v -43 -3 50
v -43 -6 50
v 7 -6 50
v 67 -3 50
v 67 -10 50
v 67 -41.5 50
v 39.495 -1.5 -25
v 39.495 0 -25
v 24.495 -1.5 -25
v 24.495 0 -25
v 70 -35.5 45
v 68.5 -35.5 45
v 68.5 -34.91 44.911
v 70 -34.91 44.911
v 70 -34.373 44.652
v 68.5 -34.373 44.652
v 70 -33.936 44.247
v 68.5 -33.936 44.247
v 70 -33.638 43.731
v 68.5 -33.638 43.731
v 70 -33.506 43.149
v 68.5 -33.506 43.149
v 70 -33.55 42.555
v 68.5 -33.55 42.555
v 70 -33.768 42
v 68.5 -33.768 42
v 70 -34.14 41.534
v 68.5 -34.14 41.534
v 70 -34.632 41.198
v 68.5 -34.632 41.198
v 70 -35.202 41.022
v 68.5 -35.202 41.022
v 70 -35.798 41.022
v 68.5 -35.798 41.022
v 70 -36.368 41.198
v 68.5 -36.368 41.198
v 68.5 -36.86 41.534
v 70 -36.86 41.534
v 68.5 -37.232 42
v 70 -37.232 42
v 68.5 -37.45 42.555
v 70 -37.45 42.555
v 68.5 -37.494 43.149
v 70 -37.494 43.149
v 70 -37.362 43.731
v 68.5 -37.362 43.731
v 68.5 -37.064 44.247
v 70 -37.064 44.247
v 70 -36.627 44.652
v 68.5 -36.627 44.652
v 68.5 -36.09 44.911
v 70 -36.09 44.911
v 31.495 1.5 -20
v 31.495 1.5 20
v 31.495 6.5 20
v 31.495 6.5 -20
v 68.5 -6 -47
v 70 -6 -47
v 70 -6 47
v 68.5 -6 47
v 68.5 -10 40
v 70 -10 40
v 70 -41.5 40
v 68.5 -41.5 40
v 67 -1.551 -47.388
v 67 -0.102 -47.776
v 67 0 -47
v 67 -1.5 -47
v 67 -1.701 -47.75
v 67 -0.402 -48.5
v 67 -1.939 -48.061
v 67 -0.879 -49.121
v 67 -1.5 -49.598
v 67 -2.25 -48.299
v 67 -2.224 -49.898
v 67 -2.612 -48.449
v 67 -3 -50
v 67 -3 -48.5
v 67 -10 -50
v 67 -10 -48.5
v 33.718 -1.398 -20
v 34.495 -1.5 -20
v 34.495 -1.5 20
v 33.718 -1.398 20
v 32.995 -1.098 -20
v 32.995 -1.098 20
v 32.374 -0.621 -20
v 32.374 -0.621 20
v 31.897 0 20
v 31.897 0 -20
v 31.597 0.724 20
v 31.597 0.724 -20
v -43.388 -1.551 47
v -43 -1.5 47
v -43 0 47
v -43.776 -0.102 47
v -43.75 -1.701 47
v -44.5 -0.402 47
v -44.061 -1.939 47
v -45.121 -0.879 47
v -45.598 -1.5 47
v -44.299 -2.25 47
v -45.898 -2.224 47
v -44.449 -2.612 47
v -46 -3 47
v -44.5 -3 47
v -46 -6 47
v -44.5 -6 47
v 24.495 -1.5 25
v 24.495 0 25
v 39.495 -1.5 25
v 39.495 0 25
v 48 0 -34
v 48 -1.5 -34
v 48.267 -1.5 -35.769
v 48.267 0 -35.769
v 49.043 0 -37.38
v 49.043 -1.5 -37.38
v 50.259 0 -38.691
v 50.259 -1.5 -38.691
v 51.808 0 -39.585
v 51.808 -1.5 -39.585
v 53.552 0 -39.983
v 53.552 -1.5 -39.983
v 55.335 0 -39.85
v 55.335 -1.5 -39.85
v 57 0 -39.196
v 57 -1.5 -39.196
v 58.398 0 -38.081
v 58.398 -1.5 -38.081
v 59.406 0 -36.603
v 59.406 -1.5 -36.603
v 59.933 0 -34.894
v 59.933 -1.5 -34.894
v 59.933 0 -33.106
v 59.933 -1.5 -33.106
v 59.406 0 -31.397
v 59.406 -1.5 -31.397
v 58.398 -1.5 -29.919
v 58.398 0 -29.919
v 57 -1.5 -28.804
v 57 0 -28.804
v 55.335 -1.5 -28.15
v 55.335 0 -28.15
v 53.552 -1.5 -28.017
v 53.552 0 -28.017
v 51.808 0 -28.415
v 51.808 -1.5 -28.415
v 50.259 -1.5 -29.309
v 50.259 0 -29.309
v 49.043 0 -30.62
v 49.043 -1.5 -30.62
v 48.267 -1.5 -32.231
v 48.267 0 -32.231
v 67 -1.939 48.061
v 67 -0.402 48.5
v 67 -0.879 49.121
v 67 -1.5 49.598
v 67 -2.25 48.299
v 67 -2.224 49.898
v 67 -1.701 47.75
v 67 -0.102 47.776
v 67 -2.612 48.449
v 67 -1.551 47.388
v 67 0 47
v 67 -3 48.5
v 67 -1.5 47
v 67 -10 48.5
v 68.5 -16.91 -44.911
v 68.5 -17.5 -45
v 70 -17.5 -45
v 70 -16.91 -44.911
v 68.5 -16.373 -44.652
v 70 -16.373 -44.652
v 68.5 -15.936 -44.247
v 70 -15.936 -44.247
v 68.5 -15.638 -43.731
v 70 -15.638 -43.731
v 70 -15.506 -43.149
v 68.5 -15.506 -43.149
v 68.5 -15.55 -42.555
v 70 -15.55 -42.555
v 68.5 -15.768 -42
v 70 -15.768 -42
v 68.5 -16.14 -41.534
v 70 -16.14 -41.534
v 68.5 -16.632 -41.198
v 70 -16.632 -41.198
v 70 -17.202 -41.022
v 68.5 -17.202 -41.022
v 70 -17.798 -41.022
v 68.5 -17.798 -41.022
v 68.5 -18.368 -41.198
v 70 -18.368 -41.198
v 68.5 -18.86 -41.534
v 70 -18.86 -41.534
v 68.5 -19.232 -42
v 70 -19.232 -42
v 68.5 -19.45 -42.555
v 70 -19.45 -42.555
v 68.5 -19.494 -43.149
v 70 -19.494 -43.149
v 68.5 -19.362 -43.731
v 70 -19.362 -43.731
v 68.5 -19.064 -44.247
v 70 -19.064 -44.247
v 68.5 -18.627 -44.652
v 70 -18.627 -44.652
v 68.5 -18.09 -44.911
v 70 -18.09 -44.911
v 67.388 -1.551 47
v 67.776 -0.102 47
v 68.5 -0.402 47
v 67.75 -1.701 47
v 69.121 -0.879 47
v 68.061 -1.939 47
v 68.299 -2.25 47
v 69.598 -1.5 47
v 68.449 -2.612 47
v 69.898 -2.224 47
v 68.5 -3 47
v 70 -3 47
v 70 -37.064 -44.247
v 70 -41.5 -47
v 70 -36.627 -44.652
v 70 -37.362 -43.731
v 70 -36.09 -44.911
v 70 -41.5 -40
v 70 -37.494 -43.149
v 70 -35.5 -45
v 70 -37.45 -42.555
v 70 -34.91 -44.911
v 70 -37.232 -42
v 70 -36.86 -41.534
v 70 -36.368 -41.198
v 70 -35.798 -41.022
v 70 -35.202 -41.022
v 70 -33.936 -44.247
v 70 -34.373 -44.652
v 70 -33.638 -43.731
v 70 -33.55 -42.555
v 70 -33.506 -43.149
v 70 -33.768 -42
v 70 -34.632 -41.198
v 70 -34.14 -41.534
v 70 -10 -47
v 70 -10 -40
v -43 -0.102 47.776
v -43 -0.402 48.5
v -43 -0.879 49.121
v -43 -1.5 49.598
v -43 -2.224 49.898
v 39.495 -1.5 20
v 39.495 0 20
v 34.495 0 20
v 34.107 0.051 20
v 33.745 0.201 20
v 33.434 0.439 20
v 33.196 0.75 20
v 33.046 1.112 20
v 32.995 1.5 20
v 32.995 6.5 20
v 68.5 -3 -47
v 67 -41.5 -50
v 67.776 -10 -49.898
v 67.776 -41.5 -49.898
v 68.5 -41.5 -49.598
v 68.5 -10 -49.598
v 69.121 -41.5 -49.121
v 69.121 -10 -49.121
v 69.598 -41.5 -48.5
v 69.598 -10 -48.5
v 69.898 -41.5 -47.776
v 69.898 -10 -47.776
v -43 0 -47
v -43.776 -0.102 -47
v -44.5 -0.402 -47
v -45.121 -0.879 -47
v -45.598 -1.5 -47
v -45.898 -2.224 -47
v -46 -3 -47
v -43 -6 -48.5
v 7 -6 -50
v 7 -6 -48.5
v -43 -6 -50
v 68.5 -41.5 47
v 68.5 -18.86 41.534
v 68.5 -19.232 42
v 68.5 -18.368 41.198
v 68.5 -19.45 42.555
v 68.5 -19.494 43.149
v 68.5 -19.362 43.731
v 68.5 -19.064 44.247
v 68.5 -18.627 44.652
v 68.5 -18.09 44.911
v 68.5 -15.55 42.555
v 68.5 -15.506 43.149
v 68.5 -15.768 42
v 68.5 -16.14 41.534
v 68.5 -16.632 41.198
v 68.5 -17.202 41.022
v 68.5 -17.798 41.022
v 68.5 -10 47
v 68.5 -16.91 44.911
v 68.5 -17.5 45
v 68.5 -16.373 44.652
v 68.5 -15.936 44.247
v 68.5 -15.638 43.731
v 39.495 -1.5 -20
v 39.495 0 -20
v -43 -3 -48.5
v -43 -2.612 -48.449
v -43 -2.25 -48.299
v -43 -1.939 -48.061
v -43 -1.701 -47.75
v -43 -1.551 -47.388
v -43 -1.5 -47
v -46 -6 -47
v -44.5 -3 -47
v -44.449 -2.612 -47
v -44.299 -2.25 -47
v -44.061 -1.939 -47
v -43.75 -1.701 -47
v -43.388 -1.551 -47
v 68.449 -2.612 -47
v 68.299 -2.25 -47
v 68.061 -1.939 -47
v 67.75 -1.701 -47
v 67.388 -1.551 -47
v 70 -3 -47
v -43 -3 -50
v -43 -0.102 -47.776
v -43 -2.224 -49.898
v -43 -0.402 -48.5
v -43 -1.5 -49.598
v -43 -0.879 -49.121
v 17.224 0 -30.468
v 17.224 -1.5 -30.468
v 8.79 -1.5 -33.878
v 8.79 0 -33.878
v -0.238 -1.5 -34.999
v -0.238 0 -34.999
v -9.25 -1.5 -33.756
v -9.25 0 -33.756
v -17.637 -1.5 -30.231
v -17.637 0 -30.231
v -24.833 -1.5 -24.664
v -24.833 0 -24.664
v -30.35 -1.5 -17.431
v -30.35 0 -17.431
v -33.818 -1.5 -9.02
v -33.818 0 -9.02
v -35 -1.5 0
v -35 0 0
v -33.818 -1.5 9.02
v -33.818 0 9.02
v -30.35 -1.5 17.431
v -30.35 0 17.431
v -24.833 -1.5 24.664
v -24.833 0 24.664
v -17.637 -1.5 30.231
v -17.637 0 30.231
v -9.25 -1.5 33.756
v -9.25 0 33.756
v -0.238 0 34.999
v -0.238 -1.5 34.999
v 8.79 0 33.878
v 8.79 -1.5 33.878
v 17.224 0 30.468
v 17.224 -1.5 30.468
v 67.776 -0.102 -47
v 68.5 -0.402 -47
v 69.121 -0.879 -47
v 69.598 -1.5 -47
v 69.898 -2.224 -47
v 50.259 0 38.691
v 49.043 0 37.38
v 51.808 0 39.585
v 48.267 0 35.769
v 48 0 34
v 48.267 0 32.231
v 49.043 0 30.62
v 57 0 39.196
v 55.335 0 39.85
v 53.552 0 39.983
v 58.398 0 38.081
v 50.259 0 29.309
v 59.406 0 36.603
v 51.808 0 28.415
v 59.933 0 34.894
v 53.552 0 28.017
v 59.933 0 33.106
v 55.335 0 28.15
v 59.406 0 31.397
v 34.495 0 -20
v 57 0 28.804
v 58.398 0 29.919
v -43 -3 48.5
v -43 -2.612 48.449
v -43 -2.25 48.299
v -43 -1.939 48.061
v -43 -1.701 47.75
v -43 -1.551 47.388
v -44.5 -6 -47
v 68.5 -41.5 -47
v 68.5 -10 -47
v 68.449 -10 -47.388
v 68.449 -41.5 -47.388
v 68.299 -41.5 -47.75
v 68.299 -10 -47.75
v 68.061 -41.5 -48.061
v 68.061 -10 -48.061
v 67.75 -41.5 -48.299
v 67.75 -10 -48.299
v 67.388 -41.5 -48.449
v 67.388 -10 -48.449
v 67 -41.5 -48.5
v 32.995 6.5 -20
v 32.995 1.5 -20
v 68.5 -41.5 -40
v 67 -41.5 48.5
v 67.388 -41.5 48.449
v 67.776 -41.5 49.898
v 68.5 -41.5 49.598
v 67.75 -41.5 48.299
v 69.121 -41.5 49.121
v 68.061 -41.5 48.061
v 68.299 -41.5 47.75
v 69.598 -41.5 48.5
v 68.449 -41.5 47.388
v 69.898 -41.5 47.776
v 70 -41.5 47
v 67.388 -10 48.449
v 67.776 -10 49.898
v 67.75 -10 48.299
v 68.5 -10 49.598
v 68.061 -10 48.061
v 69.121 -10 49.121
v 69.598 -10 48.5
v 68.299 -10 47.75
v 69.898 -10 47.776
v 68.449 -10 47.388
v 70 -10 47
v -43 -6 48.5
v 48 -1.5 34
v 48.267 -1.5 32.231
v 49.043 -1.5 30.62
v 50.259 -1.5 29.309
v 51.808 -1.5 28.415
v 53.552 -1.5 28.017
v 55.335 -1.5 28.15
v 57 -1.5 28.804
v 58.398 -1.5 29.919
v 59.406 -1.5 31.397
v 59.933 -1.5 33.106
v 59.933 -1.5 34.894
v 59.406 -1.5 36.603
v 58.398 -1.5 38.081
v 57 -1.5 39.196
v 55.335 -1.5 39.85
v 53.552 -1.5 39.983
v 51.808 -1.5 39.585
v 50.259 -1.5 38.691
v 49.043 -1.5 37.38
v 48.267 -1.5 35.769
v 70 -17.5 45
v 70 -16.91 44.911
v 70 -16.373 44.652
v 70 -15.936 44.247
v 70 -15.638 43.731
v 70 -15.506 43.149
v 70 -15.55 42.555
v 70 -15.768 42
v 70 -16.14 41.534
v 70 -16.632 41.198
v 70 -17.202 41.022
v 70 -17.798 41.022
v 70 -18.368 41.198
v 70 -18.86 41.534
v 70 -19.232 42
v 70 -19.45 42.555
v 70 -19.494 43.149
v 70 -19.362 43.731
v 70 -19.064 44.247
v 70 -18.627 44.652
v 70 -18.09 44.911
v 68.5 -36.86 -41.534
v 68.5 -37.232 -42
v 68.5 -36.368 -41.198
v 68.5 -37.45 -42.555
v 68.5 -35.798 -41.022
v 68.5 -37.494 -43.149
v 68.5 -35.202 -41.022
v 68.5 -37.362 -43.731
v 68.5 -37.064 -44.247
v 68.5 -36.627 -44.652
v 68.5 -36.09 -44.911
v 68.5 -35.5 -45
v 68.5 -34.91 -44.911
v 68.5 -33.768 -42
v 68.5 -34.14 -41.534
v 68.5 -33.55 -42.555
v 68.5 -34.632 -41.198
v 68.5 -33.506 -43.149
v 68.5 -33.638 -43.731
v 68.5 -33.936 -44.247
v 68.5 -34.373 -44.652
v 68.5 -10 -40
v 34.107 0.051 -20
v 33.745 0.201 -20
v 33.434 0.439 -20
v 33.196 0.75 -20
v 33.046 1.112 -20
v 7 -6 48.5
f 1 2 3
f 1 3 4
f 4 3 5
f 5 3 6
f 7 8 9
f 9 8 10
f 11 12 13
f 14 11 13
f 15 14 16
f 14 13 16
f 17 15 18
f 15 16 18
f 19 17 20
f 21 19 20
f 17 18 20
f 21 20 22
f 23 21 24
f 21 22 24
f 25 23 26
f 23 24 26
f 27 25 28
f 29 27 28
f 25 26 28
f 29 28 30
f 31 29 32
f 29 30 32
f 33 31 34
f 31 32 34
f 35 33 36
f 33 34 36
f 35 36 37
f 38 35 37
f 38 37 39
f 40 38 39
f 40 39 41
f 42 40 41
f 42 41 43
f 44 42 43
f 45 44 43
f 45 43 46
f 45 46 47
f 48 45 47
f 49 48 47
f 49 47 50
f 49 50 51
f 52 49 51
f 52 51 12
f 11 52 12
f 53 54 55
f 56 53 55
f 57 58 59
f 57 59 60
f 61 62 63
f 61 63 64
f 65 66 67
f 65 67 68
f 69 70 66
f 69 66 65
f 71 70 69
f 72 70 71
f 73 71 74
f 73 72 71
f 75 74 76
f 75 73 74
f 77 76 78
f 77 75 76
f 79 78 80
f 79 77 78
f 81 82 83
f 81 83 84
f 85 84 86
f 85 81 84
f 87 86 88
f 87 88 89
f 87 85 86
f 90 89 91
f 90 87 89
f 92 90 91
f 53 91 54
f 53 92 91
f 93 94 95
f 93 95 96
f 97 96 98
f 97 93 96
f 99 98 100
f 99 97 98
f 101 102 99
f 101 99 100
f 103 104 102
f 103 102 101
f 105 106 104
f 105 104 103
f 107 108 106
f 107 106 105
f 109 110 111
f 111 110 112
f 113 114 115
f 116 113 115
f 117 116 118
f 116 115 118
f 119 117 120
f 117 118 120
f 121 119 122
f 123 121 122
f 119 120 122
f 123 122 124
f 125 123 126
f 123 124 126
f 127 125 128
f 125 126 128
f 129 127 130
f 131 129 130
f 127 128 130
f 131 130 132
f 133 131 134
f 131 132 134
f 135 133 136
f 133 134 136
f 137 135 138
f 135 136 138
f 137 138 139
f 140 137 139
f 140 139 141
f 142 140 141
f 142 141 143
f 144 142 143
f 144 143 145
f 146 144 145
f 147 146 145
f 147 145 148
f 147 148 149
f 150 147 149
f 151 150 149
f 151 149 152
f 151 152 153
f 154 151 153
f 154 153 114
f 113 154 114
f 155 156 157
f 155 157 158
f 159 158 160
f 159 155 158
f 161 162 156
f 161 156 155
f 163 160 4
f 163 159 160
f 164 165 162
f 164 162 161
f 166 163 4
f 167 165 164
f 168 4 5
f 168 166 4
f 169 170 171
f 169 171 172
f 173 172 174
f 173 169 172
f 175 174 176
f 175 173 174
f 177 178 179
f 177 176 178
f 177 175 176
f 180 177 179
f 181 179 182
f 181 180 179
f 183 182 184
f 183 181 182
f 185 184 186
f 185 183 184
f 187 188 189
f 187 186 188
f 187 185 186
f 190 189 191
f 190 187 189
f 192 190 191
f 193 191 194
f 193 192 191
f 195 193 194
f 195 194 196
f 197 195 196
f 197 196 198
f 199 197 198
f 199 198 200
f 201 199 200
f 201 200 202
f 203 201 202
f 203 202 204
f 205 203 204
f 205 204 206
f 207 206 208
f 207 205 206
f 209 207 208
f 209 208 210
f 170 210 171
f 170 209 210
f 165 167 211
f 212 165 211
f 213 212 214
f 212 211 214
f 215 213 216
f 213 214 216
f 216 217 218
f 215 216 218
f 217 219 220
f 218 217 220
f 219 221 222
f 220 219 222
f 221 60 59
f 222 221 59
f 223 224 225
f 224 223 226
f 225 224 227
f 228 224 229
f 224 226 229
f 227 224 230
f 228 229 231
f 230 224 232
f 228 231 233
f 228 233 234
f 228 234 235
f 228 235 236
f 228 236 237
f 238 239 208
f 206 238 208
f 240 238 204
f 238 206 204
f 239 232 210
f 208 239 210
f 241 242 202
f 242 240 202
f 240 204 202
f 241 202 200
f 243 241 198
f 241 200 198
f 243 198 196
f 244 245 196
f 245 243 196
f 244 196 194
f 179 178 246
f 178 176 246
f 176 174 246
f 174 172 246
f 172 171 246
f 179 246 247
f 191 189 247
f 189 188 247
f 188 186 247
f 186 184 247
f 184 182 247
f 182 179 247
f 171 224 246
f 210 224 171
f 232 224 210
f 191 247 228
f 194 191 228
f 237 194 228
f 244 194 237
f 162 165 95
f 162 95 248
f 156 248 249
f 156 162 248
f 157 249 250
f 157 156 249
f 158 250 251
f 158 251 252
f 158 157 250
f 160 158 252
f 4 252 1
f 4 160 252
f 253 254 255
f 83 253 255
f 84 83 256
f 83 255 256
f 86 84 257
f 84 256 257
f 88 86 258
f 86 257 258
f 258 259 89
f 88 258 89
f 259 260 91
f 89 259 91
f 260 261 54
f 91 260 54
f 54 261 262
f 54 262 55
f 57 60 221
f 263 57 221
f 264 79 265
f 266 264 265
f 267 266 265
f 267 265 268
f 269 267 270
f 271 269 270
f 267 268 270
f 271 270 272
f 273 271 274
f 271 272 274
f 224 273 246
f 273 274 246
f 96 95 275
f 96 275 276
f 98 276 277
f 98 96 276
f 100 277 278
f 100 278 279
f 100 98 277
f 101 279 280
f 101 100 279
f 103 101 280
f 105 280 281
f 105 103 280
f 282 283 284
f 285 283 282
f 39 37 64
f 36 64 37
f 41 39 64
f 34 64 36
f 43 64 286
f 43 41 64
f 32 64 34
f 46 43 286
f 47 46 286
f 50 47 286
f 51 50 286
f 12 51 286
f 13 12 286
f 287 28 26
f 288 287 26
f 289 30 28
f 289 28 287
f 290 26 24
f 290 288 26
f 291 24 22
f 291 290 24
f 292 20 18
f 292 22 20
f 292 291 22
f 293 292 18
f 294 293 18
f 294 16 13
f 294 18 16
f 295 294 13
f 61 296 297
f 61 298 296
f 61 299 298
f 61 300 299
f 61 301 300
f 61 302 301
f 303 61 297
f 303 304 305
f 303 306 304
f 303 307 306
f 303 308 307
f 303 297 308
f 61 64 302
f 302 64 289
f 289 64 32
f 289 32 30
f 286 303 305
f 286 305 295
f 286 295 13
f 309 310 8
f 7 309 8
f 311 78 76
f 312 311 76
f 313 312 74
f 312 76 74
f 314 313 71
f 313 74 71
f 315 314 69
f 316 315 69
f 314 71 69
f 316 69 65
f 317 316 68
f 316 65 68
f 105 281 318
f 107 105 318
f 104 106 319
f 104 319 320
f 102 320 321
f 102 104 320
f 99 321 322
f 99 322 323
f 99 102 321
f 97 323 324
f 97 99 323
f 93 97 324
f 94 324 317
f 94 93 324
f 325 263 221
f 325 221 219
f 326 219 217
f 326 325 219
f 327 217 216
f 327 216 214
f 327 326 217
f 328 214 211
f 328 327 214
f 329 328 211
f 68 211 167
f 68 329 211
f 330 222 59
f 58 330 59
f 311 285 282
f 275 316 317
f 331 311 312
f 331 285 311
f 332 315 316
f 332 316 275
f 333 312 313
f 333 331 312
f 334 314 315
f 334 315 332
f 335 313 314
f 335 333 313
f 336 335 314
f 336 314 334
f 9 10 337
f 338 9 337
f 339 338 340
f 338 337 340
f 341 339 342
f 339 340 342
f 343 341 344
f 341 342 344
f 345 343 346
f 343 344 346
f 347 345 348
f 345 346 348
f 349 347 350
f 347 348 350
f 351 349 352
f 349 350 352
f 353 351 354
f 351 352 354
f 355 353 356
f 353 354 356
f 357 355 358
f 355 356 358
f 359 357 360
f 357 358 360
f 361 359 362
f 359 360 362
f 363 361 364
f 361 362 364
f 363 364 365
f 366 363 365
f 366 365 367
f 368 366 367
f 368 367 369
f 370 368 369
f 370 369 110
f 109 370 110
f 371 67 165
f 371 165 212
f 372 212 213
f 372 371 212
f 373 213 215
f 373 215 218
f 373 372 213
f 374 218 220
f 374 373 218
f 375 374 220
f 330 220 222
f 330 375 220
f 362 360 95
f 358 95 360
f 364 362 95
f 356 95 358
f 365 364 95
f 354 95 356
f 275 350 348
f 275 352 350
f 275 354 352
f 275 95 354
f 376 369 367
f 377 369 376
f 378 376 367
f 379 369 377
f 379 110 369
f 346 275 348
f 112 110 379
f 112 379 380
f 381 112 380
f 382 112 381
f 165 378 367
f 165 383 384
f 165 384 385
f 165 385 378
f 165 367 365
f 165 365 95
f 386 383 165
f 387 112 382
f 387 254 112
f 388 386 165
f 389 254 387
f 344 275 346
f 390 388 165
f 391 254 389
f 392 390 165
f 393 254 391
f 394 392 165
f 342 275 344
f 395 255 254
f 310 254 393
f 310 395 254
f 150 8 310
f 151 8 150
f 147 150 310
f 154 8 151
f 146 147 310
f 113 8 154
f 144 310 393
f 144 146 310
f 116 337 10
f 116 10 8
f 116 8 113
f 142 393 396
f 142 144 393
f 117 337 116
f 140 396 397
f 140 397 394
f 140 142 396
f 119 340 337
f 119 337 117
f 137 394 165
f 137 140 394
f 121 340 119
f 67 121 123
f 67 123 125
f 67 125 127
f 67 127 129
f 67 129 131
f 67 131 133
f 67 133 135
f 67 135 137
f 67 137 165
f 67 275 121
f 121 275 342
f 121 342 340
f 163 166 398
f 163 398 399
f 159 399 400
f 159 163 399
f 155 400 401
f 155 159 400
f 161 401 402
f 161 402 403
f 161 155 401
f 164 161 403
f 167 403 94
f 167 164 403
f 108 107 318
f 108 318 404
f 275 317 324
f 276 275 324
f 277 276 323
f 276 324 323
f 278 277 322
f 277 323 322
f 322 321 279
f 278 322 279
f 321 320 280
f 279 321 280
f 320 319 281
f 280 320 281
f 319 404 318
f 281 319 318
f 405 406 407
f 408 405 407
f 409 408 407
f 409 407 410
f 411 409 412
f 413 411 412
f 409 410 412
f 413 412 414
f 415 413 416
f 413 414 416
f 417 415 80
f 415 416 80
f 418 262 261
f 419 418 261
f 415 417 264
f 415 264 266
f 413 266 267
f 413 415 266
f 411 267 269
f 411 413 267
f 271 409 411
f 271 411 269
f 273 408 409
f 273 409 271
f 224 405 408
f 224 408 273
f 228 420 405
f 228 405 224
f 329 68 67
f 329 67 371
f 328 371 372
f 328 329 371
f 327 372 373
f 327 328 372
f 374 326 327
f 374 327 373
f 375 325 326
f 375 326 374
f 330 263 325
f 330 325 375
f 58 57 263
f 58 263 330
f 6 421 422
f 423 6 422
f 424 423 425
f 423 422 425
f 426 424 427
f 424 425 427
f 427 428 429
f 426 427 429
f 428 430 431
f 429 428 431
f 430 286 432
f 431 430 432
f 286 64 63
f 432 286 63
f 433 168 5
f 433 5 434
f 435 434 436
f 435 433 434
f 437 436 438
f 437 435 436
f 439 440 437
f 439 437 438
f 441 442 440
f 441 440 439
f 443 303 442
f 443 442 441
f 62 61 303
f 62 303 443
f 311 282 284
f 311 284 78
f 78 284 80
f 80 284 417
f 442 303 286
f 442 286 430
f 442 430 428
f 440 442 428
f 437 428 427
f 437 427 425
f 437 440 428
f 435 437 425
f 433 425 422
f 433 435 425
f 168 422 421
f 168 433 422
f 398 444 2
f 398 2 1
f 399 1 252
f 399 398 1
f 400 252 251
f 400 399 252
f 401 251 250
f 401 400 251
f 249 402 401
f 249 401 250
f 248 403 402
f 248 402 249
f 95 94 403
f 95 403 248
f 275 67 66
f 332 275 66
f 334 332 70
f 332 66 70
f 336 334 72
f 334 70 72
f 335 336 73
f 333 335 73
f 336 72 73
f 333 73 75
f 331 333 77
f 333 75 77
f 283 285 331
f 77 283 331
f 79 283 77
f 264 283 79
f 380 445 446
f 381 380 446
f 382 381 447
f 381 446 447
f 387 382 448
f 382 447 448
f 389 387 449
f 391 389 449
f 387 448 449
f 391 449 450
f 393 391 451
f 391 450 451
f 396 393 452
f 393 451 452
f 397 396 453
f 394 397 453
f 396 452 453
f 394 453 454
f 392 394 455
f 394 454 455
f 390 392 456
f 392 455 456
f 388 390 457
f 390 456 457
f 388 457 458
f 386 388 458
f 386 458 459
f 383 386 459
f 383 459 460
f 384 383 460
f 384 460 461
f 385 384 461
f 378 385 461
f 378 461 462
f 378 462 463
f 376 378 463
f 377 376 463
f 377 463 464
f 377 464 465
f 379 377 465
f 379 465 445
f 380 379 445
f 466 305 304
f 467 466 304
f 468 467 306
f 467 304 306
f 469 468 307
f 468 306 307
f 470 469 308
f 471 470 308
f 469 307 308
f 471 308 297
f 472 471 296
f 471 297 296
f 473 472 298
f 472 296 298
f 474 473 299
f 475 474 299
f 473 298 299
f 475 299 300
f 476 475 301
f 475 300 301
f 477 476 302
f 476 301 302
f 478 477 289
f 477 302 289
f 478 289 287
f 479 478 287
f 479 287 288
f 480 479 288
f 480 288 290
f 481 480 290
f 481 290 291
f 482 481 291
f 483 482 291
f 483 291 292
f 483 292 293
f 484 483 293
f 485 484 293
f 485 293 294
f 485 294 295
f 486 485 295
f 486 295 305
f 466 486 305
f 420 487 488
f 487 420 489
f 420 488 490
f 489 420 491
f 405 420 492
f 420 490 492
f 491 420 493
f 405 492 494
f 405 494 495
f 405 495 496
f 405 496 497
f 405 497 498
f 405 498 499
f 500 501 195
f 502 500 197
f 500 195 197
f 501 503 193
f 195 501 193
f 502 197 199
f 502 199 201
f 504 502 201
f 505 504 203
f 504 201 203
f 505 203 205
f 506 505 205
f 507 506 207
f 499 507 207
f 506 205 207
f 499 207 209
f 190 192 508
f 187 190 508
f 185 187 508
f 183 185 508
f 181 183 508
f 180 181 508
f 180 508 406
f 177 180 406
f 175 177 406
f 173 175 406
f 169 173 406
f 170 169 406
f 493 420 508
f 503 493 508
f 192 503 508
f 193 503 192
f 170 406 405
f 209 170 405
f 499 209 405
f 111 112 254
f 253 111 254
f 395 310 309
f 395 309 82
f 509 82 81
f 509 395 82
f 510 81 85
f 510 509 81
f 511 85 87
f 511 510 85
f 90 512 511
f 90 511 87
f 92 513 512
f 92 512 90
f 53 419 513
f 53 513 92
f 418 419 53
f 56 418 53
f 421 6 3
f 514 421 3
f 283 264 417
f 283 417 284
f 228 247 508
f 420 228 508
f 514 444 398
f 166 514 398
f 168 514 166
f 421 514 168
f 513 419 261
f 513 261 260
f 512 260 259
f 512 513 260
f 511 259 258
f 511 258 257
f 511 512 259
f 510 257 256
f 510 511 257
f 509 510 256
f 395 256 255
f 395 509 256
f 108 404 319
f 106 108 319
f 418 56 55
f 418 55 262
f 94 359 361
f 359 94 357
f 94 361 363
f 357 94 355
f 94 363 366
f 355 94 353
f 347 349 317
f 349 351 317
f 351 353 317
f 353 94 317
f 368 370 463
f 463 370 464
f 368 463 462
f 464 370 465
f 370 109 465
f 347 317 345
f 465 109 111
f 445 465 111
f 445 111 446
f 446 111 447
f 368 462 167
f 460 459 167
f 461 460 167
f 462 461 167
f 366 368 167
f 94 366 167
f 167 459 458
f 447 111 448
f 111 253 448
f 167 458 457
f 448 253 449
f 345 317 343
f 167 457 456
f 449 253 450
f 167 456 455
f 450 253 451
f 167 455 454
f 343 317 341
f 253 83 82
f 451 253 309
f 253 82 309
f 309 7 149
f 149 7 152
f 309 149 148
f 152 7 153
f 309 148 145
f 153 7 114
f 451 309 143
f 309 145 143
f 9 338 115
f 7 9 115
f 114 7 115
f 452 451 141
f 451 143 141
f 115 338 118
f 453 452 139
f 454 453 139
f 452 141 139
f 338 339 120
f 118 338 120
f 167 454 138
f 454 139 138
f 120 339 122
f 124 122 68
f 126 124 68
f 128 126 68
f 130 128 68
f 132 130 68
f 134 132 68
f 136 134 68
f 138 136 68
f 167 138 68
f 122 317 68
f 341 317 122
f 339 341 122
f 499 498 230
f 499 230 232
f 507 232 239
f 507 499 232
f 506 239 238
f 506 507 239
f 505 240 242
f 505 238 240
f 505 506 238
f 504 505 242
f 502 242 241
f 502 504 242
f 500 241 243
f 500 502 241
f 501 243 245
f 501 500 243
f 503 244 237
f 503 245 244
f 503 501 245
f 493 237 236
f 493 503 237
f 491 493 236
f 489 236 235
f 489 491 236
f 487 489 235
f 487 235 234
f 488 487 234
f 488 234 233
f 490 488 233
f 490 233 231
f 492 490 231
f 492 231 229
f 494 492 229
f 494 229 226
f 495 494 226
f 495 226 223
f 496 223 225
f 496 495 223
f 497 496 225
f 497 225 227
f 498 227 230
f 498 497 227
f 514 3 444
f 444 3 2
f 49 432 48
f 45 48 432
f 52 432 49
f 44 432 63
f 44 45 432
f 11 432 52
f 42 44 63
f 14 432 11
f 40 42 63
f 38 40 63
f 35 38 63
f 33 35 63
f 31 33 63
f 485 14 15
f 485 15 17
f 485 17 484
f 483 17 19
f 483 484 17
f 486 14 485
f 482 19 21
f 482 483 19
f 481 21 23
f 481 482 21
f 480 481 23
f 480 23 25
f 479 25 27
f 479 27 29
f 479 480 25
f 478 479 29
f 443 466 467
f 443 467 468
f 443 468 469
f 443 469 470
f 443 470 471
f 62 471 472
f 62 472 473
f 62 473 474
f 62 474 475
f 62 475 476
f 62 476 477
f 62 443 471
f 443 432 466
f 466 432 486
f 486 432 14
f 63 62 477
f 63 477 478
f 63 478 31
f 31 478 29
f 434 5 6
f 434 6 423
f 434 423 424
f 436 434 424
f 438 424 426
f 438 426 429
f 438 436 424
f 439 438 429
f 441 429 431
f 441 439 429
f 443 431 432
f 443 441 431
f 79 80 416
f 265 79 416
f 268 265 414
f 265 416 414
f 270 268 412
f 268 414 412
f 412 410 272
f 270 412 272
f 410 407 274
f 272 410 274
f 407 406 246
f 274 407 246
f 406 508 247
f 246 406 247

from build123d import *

# Parameters (mm, degrees)
SKETCH1_W                    = 110
SKETCH1_H                    = 100
BASE_FLANGE1_DEPTH           = 1.5
EDGE_FLANGE1_STRIP_W         = 9
EDGE_FLANGE1_STRIP_H         = 1.5
EDGE_FLANGE1_STRIP_CUT_DEPTH = 110
EDGE_FLANGE1_DEPTH           = 110
EDGE_FLANGE1_FLAT_DEPTH      = 1.5
EDGE_FLANGE2_DEPTH           = 31.5
F_4_0_4_DIAMETER_HOLE1_D     = 4
EDGE_FLANGE3_DEPTH           = 94
EDGE_FLANGE3_BEND_DEPTH      = 94
F_12_0_12_DIAMETER_HOLE1_D   = 12
EDGE_FLANGE4_STRIP_W         = 9
EDGE_FLANGE4_STRIP_H         = 1.5
EDGE_FLANGE4_STRIP_CUT_DEPTH = 40
EDGE_FLANGE4_DEPTH           = 40


# Sheet-metal steps are written as plain solids
with BuildPart() as part:
    # Sketch1 → Base-Flange1 (new body)
    with BuildSketch(Plane(origin=(0, 0, 0), x_dir=(1, 0, 0), z_dir=(0, 1, 0))):
        with Locations((12, 0)):
            Rectangle(SKETCH1_W, SKETCH1_H)
        with BuildLine():
            Line((24.494897428, -25), (39.494897428, -25))
            Line((39.494897428, -25), (39.494897428, -20))
            Line((39.494897428, -20), (31.494897428, -20))
            Line((31.494897428, -20), (31.494897428, 20))
            Line((31.494897428, 20), (39.494897428, 20))
            Line((39.494897428, 20), (39.494897428, 25))
            Line((39.494897428, 25), (24.494897428, 25))
            ThreePointArc((24.494897428, 25), (-35, 0), (24.494897428, -25))
        make_face(mode=Mode.SUBTRACT)
    extrude(amount=-BASE_FLANGE1_DEPTH)

    # Edge-Flange1 strip (across the edge) → Edge-Flange1 strip cut (cut)
    with BuildSketch(Plane(origin=(67, -1.5, 50), x_dir=(0, 0, -1), z_dir=(-1, 0, 0))):
        with Locations((-1.5, -0.75)):
            Rectangle(EDGE_FLANGE1_STRIP_W, EDGE_FLANGE1_STRIP_H)
    edge_flange1_strip_cut = extrude(amount=EDGE_FLANGE1_STRIP_CUT_DEPTH, mode=Mode.SUBTRACT)

    # Edge-Flange1 bend section (across the edge) → Edge-Flange1 (add)
    with BuildSketch(Plane(origin=(67, -1.5, 50), x_dir=(0, 0, -1), z_dir=(-1, 0, 0))):
        with BuildLine():
            Line((0, 1.5), (1.5, 1.5))
            ThreePointArc((1.5, 1.5), (1.939339828, 0.439339828), (3, 0))
            Line((3, 0), (3, -1.5))
            ThreePointArc((3, -1.5), (0.878679656, -0.621320344), (0, 1.5))
        make_face()
    edge_flange1 = extrude(amount=EDGE_FLANGE1_DEPTH)

    # Edge-Flange1 profile (on flange) → Edge-Flange1 flat (add)
    with BuildSketch(Plane(origin=(0, -1.5, 50), x_dir=(1, 0, 0), z_dir=(0, 0, -1))):
        Polygon((-43, 1.5), (67, 1.5), (67, 40), (7, 4.5), (-43, 4.5), align=None)
    edge_flange1_flat = extrude(amount=EDGE_FLANGE1_FLAT_DEPTH)

    # Edge-Flange2 section (across the edge) → Edge-Flange2 (add)
    with BuildSketch(Plane(origin=(68.5, -10, 48.5), x_dir=(-1, 0, 0), z_dir=(0, -1, 0))):
        with BuildLine():
            Line((-1.5, 1.5), (-1.5, 8.5))
            Line((-1.5, 8.5), (0, 8.5))
            Line((0, 8.5), (0, 1.5))
            ThreePointArc((0, 1.5), (0.439339828, 0.439339828), (1.5, 0))
            Line((1.5, 0), (1.5, -1.5))
            ThreePointArc((1.5, -1.5), (-0.621320344, -0.621320344), (-1.5, 1.5))
        make_face()
    edge_flange2 = extrude(amount=EDGE_FLANGE2_DEPTH)

    # Ø4.0 (4) Diameter Hole1 (through all)
    with Locations(Plane(origin=(70, 0, 0), x_dir=(0, 0, -1), z_dir=(1, 0, 0))):
        with Locations((-43, -17.5), (-43, -35.5)):
            f_4_0_4_diameter_hole1 = Hole(F_4_0_4_DIAMETER_HOLE1_D / 2)

    # Mirror1: Edge-Flange1 strip cut, Edge-Flange1, Edge-Flange1 flat, Edge-Flange2, Ø4.0 (4) Diameter Hole1 across plane
    add(edge_flange1_strip_cut.mirror(Plane.XY), mode=Mode.SUBTRACT)
    add(edge_flange1.mirror(Plane.XY))
    add(edge_flange1_flat.mirror(Plane.XY))
    add(edge_flange2.mirror(Plane.XY))
    add(f_4_0_4_diameter_hole1.mirror(Plane.XY), mode=Mode.SUBTRACT)

    # Edge-Flange3 section (across the edge) → Edge-Flange3 (add)
    with BuildSketch(Plane(origin=(68.5, -1.5, -47), x_dir=(-1, 0, 0), z_dir=(0, 0, 1))):
        with BuildLine():
            Line((-1.5, 1.5), (-1.5, 4.5))
            Line((-1.5, 4.5), (0, 4.5))
            Line((0, 4.5), (0, 1.5))
            ThreePointArc((0, 1.5), (0.439339828, 0.439339828), (1.5, 0))
            Line((1.5, 0), (1.5, -1.5))
            ThreePointArc((1.5, -1.5), (-0.621320344, -0.621320344), (-1.5, 1.5))
        make_face()
    extrude(amount=EDGE_FLANGE3_DEPTH)

    # Edge-Flange3 section 2 (across the edge) → Edge-Flange3 bend (add)
    with BuildSketch(Plane(origin=(-44.5, -1.5, 47), x_dir=(1, 0, 0), z_dir=(0, 0, -1))):
        with BuildLine():
            Line((-1.5, 1.5), (-1.5, 4.5))
            Line((-1.5, 4.5), (0, 4.5))
            Line((0, 4.5), (0, 1.5))
            ThreePointArc((0, 1.5), (0.439339828, 0.439339828), (1.5, 0))
            Line((1.5, 0), (1.5, -1.5))
            ThreePointArc((1.5, -1.5), (-0.621320344, -0.621320344), (-1.5, 1.5))
        make_face()
    extrude(amount=EDGE_FLANGE3_BEND_DEPTH)

    # Ø12.0 (12) Diameter Hole1 (through all)
    with Locations(Plane(origin=(0, 0, 0), x_dir=(1, 0, 0), z_dir=(0, 1, 0))):
        with Locations((54, 34), (54, -34)):
            Hole(F_12_0_12_DIAMETER_HOLE1_D / 2)

    # Edge-Flange4 strip (across the edge) → Edge-Flange4 strip cut (cut)
    with BuildSketch(Plane(origin=(31.494897428, 0, -20), x_dir=(1, 0, 0), z_dir=(0, 0, 1))):
        with Locations((-1.5, -0.75)):
            Rectangle(EDGE_FLANGE4_STRIP_W, EDGE_FLANGE4_STRIP_H)
    extrude(amount=EDGE_FLANGE4_STRIP_CUT_DEPTH, mode=Mode.SUBTRACT)

    # Edge-Flange4 section (across the edge) → Edge-Flange4 (add)
    with BuildSketch(Plane(origin=(31.494897428, 0, -20), x_dir=(1, 0, 0), z_dir=(0, 0, 1))):
        with BuildLine():
            Line((0, 1.5), (0, 6.5))
            Line((0, 6.5), (1.5, 6.5))
            Line((1.5, 6.5), (1.5, 1.5))
            ThreePointArc((1.5, 1.5), (1.939339828, 0.439339828), (3, 0))
            Line((3, 0), (3, -1.5))
            ThreePointArc((3, -1.5), (0.878679656, -0.621320344), (0, 1.5))
        make_face()
    extrude(amount=EDGE_FLANGE4_DEPTH)


solid = part.part
